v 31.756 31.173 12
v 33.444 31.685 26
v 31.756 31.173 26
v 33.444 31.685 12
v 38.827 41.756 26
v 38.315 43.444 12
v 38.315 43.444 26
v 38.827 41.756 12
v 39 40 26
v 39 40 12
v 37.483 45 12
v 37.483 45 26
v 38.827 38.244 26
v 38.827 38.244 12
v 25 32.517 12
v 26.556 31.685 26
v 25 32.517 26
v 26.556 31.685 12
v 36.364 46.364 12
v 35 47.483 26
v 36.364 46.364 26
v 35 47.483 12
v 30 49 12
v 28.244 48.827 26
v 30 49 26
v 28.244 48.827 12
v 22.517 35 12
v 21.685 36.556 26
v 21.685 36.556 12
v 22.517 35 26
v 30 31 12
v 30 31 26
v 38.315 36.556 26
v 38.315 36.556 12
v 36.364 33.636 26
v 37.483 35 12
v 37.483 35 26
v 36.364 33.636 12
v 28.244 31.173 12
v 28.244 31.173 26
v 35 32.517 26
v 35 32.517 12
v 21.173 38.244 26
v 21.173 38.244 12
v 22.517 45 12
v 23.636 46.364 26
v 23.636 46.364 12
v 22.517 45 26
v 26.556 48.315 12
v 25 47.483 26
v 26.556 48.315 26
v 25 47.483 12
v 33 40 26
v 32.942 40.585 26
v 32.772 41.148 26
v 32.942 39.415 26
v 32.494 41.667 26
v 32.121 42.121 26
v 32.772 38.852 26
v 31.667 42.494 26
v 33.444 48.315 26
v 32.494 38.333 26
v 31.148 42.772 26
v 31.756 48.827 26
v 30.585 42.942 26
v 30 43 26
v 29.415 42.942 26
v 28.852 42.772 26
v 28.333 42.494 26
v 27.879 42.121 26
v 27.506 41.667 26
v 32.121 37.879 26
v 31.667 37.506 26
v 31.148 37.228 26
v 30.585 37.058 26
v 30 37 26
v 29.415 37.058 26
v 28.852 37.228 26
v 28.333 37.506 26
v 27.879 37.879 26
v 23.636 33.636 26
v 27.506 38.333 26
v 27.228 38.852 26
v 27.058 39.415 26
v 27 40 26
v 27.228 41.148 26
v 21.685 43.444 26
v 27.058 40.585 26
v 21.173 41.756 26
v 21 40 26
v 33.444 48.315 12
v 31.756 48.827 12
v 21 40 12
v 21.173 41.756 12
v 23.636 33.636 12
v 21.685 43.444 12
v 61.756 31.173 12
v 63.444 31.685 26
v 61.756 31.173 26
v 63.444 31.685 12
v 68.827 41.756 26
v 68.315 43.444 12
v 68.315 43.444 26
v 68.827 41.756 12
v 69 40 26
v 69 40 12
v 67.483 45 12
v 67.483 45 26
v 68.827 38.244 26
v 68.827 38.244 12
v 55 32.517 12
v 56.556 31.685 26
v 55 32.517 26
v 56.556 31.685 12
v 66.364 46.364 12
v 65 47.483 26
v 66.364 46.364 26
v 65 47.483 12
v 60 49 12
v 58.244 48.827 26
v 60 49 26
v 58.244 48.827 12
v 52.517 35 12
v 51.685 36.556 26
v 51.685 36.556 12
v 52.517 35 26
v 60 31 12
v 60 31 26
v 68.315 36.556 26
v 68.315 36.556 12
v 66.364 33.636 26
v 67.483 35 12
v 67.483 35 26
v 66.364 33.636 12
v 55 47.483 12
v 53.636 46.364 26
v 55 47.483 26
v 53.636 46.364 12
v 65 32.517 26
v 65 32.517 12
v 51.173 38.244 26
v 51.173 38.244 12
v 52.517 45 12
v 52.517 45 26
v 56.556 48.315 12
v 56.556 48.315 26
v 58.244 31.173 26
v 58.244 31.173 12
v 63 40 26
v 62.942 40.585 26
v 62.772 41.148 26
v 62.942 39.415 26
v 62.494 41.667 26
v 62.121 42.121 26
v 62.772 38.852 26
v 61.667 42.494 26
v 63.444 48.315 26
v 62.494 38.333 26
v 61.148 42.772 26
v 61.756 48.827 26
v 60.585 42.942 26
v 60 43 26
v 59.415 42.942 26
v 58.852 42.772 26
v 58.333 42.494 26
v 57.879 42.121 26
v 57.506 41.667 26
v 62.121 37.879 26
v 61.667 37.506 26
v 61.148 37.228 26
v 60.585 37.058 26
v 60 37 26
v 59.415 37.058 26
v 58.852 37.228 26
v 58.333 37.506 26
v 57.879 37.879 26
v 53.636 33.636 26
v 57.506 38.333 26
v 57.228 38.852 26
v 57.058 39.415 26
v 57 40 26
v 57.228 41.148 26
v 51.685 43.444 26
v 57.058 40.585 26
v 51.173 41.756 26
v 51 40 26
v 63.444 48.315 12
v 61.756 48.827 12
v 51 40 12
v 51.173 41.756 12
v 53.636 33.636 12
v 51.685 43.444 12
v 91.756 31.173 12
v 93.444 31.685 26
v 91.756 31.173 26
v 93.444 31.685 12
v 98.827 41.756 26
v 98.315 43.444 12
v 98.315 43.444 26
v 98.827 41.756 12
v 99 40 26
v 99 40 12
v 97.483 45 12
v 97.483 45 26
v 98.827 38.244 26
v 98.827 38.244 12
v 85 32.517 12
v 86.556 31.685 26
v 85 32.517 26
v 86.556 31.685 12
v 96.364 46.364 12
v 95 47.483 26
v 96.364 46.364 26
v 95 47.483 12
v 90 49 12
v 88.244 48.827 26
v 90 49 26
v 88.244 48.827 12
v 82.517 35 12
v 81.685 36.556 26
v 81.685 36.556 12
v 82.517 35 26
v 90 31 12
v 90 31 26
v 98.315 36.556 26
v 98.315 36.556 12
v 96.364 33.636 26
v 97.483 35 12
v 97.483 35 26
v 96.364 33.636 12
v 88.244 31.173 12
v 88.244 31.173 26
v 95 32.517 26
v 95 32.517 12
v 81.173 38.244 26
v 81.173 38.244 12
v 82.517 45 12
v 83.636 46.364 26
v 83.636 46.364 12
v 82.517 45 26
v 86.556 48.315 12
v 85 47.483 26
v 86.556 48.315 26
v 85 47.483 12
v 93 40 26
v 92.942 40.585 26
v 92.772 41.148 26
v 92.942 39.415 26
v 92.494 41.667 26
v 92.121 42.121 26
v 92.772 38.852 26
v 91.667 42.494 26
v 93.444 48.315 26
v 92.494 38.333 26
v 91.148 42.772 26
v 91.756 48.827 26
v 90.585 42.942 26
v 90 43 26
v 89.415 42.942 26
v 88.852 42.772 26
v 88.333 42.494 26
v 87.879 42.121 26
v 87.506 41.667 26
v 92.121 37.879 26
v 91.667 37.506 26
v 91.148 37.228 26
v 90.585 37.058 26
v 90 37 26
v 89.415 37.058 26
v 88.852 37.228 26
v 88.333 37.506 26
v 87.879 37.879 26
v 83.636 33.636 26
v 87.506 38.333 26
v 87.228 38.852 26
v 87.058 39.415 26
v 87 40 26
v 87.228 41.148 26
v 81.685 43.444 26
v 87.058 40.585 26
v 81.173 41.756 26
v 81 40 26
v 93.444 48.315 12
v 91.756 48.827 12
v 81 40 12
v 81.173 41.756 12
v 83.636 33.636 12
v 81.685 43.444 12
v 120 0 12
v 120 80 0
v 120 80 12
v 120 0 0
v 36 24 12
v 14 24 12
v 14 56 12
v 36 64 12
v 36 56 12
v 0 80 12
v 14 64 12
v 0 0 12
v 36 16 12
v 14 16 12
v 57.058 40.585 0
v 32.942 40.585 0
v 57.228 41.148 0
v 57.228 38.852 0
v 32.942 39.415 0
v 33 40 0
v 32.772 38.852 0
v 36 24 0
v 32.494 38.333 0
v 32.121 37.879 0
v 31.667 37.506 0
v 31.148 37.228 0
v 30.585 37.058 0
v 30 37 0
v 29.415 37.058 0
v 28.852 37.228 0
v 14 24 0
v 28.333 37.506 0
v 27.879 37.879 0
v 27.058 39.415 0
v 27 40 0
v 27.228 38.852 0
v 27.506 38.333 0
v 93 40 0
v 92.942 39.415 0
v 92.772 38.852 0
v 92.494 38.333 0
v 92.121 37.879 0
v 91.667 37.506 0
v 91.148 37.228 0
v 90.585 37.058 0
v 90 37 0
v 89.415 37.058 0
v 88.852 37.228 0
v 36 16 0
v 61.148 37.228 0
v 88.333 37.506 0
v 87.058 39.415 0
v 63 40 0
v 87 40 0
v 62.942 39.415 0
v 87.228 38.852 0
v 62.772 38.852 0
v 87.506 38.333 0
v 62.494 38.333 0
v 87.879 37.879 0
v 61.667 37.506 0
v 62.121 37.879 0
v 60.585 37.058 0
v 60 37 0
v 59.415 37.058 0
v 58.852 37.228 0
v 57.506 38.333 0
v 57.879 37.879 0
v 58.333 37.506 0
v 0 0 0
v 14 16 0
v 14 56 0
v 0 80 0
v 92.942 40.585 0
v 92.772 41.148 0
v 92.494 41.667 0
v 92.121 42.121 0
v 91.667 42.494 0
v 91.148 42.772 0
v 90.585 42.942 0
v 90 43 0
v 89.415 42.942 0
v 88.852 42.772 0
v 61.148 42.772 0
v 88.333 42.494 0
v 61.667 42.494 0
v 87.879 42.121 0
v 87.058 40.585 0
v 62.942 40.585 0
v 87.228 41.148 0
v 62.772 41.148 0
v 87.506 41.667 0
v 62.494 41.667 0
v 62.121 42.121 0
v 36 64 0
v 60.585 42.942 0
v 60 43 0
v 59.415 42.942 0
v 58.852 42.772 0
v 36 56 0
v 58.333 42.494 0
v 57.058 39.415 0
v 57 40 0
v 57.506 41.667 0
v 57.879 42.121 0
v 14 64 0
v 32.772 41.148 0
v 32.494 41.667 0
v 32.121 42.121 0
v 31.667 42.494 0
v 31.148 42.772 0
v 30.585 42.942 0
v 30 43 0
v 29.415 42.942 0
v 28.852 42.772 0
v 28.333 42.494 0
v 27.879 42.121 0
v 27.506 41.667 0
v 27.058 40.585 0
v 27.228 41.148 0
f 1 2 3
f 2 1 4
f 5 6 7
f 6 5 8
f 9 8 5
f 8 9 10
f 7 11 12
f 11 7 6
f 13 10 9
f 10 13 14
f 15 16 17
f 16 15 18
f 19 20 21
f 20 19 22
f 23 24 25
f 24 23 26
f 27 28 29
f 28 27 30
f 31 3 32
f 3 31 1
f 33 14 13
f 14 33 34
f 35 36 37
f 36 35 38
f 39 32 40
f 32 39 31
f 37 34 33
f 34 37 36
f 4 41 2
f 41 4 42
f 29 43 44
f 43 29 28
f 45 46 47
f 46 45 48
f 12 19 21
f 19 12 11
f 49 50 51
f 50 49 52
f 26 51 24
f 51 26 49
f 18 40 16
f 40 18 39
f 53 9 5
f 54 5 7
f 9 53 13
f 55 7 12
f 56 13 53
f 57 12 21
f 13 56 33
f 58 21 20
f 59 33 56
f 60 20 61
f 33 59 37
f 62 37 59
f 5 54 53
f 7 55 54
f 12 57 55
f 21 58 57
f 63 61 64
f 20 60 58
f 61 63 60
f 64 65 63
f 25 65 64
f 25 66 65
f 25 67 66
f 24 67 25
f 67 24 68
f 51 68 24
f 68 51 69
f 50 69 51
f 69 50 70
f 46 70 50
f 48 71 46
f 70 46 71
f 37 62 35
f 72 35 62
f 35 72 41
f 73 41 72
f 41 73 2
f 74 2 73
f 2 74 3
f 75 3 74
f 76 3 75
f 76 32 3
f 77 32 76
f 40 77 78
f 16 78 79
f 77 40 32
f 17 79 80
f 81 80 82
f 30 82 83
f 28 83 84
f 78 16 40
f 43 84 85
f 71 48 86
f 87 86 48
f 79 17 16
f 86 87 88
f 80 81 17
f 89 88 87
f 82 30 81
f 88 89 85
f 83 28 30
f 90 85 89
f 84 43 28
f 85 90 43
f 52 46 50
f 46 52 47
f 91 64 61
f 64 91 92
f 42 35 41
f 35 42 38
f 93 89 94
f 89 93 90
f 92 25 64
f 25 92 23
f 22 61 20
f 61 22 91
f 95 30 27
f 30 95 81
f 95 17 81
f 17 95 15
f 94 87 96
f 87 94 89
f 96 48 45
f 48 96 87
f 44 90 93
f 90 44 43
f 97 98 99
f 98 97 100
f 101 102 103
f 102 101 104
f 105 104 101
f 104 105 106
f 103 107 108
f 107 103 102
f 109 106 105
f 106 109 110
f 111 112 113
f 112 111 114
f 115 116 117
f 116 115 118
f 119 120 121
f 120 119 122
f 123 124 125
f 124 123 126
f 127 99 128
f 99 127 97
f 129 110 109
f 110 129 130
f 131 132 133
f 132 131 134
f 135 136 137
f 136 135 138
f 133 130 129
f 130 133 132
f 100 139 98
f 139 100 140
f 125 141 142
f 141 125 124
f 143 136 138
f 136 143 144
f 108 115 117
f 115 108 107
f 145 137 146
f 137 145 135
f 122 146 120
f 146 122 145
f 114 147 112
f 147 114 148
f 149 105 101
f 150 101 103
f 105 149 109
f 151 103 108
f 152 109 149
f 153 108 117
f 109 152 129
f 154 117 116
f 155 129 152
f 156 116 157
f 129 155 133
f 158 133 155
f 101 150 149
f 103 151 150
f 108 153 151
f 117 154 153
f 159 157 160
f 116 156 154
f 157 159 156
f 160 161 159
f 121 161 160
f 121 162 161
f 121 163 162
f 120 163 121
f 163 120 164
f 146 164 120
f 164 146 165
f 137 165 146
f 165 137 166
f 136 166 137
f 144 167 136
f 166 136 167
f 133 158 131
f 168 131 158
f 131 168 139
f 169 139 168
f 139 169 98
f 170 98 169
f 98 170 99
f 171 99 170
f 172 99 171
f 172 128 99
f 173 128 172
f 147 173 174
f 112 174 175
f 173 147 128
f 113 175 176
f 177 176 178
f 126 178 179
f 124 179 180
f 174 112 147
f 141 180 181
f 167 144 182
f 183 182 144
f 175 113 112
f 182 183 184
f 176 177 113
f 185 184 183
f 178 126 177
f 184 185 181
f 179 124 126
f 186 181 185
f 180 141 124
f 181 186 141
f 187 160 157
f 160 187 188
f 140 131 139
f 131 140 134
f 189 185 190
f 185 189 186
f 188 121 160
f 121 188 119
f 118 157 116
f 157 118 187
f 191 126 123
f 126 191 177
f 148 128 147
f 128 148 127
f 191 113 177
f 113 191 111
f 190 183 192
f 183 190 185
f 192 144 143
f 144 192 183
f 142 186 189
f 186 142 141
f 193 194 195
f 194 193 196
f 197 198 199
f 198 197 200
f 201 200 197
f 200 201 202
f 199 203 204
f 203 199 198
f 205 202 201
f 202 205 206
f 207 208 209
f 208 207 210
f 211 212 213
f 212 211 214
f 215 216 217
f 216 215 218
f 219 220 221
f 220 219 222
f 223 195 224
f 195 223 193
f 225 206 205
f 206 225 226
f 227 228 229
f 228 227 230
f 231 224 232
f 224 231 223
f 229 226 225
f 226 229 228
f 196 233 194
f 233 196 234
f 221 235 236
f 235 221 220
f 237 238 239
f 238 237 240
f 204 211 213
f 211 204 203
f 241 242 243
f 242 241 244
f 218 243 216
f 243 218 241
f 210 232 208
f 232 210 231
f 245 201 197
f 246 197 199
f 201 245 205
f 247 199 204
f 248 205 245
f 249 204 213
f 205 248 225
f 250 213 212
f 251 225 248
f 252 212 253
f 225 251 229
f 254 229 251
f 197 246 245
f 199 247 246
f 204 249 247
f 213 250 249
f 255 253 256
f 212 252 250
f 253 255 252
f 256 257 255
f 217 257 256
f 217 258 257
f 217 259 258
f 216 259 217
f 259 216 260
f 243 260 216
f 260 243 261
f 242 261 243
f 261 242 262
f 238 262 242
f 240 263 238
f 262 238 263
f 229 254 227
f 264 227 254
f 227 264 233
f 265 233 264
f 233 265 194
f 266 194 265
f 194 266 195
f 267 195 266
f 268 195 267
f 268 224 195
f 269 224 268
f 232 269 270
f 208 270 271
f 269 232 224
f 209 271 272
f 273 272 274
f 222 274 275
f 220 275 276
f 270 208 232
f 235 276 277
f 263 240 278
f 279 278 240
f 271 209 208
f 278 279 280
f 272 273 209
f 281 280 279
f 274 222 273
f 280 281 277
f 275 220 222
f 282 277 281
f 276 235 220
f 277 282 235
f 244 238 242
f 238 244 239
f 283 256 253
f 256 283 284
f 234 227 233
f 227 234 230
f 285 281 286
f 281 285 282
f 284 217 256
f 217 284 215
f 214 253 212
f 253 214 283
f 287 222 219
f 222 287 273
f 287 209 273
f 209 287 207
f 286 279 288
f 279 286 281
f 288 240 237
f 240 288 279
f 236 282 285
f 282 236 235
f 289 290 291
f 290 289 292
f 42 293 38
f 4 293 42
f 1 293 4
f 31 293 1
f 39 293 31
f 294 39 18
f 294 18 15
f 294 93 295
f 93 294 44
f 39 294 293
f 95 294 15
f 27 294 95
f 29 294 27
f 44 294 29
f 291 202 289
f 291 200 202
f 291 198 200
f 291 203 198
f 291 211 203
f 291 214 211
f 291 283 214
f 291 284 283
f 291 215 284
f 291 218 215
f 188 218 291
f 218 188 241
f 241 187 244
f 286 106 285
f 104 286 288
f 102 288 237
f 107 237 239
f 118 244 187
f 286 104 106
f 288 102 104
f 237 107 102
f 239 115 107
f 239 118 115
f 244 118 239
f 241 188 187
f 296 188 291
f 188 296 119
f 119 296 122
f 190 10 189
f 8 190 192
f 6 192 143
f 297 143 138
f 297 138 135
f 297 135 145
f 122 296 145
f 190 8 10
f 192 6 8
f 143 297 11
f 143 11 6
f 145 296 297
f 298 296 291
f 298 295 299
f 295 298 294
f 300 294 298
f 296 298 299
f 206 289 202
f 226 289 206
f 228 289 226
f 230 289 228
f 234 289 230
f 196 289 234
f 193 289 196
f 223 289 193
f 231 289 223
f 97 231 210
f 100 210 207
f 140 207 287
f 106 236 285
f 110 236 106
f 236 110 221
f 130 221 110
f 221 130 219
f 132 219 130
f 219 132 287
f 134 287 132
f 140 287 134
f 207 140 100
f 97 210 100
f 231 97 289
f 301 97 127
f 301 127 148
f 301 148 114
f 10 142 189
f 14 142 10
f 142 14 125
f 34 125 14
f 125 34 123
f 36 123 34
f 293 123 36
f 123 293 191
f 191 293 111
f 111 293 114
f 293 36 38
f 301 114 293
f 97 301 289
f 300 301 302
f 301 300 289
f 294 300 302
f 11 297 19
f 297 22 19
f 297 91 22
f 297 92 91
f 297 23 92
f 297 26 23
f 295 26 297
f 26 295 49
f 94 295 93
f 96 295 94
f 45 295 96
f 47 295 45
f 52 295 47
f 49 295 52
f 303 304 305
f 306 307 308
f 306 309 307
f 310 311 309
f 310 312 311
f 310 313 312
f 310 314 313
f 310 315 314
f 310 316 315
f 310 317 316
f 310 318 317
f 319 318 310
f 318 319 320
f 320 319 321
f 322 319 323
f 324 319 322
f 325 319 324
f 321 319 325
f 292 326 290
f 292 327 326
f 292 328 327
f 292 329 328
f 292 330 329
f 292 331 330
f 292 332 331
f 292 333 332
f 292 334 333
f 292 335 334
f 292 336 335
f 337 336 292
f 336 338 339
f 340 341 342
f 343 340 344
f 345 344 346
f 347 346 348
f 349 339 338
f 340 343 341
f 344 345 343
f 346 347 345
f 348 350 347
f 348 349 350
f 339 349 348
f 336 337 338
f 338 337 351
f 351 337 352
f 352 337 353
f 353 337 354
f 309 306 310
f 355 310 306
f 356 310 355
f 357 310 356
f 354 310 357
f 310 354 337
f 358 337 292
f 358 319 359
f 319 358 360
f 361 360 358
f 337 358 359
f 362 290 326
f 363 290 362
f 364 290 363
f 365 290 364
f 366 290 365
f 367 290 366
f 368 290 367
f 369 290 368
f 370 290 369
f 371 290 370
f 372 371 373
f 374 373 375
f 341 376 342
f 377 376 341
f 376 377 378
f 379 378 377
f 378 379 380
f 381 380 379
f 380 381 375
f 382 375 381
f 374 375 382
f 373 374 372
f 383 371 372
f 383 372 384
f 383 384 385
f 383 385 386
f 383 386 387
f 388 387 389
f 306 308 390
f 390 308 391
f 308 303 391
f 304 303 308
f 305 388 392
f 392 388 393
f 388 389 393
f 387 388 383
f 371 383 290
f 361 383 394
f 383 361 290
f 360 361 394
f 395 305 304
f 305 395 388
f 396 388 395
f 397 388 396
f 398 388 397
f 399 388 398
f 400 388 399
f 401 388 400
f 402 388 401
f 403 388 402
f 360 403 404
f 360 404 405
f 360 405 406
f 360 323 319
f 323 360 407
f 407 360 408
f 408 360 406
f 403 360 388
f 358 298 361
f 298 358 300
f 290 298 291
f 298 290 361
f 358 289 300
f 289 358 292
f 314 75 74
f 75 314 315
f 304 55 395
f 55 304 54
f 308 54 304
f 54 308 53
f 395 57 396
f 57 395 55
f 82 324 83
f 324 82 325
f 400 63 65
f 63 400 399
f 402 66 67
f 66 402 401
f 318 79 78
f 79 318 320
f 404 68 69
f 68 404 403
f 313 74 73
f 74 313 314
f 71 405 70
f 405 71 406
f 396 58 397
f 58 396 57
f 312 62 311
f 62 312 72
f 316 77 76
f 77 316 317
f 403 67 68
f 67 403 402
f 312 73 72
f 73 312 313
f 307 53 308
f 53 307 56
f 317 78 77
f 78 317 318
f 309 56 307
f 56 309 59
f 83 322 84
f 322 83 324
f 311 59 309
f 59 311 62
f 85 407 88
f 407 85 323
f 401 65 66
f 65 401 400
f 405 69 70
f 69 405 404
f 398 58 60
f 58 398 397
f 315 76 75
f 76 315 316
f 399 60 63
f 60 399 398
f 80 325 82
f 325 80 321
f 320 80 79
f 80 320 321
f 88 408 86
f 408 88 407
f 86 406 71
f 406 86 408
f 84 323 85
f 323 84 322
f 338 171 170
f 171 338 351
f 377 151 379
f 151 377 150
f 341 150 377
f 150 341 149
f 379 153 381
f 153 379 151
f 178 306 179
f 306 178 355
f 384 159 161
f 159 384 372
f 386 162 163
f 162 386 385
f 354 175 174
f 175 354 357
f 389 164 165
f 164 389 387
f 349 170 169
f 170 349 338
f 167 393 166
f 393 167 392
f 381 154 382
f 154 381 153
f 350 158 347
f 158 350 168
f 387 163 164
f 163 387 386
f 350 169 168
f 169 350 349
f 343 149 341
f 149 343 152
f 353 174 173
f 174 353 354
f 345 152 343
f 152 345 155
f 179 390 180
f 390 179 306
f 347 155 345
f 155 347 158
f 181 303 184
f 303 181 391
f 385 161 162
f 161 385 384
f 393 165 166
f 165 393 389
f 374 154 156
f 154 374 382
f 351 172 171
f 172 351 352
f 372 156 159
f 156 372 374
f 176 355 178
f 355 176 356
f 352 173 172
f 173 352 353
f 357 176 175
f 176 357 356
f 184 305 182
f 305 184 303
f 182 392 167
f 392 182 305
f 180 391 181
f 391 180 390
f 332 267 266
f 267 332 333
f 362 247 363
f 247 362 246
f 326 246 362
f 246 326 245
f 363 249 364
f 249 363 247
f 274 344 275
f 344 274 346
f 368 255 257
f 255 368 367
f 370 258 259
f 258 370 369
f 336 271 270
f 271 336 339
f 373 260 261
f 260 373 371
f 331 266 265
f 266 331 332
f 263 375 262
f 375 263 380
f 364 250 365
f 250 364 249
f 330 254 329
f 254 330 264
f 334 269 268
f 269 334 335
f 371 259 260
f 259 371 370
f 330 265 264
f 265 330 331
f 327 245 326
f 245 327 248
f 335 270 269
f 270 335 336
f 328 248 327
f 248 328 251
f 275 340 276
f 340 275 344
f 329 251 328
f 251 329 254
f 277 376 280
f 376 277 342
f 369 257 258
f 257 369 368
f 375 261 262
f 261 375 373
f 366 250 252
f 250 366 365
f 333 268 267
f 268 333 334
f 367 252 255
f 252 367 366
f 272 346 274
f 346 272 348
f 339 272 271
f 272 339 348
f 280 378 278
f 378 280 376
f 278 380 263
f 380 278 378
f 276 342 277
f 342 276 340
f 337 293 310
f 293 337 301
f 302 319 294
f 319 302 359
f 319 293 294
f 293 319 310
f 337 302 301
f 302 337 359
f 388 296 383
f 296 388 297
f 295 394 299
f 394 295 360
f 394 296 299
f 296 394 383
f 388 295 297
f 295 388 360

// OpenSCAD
$fn = 32;

// ----------------------------------------------------------------------
// Drill jig: three_boss_slot jig
// ----------------------------------------------------------------------

// --- parameters (mm) ---
plate_l = 120;            // plate length, X
plate_w = 80;             // plate width, Y
plate_t = 12;             // plate thickness
boss_d = 18;              // guide boss diameter
boss_h = 15;              // boss height above the plate
guide_d = 6;              // guide hole diameter
boss_pitch = 30;          // boss pitch
slot_w = 8;               // clamp slot width
slot_l = 22;              // clamp slot length
slot_x = 14;              // slot start X

n_boss = 3;  // guide bosses
boss_x0 = (plate_l - (n_boss - 1) * boss_pitch) / 2;  // first boss X
boss_top = plate_t - 1 + boss_h;  // boss crown height
total_h = boss_top;  // overall height

difference() {
  union() {
  cube([plate_l, plate_w, plate_t]);
  for (i = [0 : n_boss - 1])
    translate([boss_x0 + i * boss_pitch, plate_w / 2, plate_t - 1])
      cylinder(h = boss_h, d = boss_d);
  }
  for (i = [0 : n_boss - 1])
    translate([boss_x0 + i * boss_pitch, plate_w / 2, -1])
      cylinder(h = plate_t + boss_h, d = guide_d);
  for (cy = [plate_w * 0.25, plate_w * 0.75])
    translate([slot_x, cy - slot_w / 2, -1])
      cube([slot_l, slot_w, plate_t + 2]);
}
